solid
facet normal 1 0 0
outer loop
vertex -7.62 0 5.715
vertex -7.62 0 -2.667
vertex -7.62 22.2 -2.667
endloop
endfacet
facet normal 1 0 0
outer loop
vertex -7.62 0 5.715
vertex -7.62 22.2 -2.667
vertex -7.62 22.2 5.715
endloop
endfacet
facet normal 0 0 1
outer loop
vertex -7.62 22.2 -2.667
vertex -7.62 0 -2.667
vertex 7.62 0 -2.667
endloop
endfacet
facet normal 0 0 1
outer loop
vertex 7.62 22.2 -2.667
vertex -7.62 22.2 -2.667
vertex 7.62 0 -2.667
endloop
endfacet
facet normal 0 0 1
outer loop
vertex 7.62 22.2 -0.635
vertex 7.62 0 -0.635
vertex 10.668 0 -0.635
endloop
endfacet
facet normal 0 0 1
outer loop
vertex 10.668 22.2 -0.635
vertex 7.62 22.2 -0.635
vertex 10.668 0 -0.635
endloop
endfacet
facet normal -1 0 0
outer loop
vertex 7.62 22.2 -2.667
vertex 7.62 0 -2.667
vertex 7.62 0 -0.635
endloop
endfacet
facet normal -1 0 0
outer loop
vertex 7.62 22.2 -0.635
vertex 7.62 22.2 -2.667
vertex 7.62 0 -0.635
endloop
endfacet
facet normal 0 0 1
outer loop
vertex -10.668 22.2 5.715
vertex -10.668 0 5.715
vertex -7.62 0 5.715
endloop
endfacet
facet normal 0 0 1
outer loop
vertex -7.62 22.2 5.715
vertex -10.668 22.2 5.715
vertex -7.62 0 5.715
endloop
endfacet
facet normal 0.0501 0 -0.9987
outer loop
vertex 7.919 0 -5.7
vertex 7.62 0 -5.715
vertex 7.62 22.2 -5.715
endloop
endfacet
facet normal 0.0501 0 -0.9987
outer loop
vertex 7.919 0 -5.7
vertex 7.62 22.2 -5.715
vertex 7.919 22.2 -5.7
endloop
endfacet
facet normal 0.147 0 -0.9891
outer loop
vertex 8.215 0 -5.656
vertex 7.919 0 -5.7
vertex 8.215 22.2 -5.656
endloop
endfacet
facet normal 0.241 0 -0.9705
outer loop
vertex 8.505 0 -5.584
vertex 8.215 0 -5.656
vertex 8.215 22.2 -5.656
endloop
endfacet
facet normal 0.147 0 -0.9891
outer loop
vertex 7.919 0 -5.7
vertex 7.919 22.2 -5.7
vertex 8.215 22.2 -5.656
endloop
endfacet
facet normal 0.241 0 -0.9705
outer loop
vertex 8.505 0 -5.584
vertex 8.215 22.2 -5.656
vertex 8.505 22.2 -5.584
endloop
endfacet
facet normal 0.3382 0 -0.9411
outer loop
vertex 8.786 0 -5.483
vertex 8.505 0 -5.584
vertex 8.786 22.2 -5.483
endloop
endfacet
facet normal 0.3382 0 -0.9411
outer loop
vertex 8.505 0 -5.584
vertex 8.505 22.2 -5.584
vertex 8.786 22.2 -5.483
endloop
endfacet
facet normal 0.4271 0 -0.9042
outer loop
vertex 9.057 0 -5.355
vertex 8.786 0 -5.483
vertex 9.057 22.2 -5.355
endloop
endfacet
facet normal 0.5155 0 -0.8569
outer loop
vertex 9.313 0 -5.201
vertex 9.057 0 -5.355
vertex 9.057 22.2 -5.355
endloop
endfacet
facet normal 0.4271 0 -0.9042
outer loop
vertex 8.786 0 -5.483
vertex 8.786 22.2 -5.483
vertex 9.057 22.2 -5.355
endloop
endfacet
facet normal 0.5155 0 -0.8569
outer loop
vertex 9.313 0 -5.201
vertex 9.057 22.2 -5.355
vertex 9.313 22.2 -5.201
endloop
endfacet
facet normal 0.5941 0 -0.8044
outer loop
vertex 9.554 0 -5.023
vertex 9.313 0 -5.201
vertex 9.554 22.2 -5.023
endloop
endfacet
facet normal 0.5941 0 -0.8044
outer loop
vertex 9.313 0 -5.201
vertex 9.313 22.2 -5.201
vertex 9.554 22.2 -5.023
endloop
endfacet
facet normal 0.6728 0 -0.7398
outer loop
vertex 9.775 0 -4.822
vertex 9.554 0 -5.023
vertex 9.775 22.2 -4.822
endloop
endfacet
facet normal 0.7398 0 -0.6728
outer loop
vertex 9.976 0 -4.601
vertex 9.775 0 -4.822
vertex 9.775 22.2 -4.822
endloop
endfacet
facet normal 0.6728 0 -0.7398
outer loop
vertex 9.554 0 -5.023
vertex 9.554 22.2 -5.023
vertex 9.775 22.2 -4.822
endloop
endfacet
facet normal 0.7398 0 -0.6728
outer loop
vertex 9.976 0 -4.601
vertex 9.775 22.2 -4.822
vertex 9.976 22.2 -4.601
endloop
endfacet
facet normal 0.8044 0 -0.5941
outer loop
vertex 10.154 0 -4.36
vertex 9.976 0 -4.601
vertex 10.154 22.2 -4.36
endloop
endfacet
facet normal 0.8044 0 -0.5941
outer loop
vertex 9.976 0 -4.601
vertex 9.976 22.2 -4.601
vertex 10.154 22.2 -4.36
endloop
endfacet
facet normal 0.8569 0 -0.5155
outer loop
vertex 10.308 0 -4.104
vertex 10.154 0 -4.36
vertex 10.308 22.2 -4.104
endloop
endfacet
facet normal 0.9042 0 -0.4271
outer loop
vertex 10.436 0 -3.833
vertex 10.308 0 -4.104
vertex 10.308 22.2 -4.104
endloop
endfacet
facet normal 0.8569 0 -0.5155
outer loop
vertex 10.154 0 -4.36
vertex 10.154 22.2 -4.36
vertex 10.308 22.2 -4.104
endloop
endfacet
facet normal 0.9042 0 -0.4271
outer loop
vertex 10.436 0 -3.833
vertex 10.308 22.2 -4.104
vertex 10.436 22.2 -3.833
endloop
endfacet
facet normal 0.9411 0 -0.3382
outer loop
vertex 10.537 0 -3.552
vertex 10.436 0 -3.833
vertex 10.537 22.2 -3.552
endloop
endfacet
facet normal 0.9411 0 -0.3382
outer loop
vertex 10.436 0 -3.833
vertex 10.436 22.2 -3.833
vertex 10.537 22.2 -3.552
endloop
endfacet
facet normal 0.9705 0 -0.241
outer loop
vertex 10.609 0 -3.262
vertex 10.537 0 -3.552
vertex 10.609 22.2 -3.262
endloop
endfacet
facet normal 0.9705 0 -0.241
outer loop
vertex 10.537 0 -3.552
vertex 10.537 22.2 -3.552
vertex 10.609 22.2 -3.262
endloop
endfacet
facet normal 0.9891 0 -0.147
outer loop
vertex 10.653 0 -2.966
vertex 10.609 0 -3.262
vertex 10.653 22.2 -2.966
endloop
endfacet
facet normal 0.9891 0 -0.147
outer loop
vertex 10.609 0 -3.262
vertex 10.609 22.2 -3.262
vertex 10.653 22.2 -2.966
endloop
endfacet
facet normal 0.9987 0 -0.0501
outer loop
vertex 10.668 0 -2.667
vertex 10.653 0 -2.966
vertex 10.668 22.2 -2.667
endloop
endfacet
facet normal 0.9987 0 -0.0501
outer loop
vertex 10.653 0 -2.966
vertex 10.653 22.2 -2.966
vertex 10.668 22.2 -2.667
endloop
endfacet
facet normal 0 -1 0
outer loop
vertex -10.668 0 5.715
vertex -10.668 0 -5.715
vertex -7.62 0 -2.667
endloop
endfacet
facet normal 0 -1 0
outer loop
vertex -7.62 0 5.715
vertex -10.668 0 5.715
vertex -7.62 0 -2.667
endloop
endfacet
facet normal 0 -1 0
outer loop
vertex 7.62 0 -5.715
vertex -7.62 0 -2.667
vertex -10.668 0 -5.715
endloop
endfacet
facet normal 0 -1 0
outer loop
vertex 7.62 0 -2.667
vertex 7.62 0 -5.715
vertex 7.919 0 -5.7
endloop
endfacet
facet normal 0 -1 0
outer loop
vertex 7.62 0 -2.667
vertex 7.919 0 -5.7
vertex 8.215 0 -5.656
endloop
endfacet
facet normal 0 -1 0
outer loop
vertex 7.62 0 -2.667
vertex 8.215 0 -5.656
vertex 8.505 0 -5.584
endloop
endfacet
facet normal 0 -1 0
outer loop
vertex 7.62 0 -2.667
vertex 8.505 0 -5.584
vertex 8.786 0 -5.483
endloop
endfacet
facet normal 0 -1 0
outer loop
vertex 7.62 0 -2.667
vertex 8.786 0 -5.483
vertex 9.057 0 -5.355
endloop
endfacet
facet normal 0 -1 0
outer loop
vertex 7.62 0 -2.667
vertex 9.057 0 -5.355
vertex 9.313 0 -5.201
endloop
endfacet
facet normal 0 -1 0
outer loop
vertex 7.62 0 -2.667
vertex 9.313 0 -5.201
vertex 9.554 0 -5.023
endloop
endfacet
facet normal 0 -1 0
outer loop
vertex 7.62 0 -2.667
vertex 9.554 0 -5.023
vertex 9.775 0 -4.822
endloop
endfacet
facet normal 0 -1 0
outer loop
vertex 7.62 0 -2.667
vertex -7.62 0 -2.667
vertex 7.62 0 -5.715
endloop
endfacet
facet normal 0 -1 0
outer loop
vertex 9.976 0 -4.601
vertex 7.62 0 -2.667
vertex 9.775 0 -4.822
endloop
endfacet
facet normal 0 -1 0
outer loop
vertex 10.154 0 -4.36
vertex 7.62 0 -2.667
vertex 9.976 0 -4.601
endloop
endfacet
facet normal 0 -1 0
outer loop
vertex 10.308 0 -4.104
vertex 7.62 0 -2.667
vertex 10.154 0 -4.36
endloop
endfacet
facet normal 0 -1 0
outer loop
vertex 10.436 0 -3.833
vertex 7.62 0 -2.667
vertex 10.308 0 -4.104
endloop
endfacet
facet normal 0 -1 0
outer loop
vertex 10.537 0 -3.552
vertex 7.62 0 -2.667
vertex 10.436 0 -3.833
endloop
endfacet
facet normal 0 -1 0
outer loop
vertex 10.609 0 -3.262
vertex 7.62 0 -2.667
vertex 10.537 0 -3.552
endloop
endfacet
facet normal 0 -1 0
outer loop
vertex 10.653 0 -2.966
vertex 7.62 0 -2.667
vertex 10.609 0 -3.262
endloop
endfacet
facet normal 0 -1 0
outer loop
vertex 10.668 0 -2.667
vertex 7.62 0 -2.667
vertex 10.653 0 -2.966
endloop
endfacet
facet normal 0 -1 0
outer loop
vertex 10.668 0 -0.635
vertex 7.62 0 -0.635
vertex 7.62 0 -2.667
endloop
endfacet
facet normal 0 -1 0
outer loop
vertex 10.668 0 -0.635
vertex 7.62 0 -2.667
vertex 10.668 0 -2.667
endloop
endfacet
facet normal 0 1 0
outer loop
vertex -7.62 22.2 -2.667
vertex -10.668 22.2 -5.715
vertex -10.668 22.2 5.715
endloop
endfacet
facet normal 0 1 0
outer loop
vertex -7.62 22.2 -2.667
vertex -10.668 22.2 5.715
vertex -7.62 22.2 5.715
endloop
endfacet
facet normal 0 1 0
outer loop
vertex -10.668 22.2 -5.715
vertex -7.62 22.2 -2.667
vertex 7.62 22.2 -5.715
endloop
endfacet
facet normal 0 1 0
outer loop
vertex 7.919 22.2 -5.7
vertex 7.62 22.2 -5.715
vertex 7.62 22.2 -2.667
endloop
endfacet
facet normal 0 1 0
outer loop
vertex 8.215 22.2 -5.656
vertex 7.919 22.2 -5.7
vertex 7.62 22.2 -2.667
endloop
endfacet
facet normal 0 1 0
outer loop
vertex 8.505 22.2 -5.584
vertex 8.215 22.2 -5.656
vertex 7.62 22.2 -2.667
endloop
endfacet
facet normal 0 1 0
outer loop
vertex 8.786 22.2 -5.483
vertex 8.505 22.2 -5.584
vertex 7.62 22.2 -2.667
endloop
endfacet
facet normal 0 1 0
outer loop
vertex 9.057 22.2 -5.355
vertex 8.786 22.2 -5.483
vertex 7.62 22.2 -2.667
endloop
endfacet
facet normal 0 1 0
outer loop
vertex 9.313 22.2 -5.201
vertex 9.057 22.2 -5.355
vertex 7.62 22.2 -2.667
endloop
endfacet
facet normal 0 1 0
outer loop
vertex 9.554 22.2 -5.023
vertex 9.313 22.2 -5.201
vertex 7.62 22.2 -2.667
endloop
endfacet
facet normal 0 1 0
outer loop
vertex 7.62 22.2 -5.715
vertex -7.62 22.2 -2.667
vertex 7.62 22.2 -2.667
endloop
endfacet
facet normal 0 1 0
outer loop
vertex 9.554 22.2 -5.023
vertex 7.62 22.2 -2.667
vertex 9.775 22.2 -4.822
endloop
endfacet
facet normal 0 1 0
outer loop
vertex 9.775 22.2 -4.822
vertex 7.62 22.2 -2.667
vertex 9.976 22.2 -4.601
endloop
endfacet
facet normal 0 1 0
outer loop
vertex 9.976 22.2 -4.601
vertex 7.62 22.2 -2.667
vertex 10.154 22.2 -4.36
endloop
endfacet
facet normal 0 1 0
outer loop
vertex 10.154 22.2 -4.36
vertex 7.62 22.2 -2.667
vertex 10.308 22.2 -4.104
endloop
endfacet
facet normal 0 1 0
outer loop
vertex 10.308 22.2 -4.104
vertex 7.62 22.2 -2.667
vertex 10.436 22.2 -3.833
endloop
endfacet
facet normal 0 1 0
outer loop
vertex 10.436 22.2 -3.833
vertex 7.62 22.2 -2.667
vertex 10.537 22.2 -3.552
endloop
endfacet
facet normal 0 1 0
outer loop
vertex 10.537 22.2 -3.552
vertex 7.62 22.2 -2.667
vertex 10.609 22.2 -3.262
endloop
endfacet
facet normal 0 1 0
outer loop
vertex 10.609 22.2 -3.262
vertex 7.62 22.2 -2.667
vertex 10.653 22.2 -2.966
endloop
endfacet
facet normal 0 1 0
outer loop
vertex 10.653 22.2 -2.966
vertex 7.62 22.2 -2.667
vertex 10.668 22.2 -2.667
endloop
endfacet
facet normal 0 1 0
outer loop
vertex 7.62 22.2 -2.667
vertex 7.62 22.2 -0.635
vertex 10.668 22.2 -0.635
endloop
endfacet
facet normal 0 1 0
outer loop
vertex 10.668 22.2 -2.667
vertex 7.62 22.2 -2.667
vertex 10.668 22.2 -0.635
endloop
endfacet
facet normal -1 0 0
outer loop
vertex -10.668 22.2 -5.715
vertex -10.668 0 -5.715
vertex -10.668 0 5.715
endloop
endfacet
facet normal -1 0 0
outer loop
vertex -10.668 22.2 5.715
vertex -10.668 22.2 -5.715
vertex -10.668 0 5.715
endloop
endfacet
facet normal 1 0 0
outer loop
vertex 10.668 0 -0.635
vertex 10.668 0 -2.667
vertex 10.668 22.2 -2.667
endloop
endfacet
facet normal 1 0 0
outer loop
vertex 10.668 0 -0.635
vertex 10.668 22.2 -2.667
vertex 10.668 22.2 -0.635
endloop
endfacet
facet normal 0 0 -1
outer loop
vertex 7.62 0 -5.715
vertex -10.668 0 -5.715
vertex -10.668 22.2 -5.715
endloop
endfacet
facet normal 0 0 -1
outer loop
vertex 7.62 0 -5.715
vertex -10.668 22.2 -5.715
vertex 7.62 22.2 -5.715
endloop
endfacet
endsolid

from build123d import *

# Parameters (mm, degrees)
F0_W     = 21.336
F0_H     = 11.43
F1_DEPTH = 22.1996
F2_W     = 15.24
F2_H     = 8.382
F3_DEPTH = 25.4
F4_W     = 3.048
F4_H     = 6.35
F5_DEPTH = 25.4
F6_R     = 3.048


with BuildPart() as f1:
    # F0 (on Front) → F1 (new body)
    with BuildSketch(Plane.XZ):
        Rectangle(F0_W, F0_H)
    extrude(amount=-F1_DEPTH)

    # F2 (on face) → F3 (cut)
    with BuildSketch(Plane.XZ):
        with Locations((0, 1.524)):
            Rectangle(F2_W, F2_H)
    extrude(amount=-F3_DEPTH, mode=Mode.SUBTRACT)

    # F4 (on face) → F5 (cut)
    with BuildSketch(Plane.XZ):
        with Locations((9.144, 2.54)):
            Rectangle(F4_W, F4_H)
    extrude(amount=-F5_DEPTH, mode=Mode.SUBTRACT)

    # F6
    f6_edges = [f1.edges().sort_by_distance(p)[0] for p in [
        (10.668, 11.0998, -5.715),
    ]]
    fillet(f6_edges, radius=F6_R)


solid = f1.part
